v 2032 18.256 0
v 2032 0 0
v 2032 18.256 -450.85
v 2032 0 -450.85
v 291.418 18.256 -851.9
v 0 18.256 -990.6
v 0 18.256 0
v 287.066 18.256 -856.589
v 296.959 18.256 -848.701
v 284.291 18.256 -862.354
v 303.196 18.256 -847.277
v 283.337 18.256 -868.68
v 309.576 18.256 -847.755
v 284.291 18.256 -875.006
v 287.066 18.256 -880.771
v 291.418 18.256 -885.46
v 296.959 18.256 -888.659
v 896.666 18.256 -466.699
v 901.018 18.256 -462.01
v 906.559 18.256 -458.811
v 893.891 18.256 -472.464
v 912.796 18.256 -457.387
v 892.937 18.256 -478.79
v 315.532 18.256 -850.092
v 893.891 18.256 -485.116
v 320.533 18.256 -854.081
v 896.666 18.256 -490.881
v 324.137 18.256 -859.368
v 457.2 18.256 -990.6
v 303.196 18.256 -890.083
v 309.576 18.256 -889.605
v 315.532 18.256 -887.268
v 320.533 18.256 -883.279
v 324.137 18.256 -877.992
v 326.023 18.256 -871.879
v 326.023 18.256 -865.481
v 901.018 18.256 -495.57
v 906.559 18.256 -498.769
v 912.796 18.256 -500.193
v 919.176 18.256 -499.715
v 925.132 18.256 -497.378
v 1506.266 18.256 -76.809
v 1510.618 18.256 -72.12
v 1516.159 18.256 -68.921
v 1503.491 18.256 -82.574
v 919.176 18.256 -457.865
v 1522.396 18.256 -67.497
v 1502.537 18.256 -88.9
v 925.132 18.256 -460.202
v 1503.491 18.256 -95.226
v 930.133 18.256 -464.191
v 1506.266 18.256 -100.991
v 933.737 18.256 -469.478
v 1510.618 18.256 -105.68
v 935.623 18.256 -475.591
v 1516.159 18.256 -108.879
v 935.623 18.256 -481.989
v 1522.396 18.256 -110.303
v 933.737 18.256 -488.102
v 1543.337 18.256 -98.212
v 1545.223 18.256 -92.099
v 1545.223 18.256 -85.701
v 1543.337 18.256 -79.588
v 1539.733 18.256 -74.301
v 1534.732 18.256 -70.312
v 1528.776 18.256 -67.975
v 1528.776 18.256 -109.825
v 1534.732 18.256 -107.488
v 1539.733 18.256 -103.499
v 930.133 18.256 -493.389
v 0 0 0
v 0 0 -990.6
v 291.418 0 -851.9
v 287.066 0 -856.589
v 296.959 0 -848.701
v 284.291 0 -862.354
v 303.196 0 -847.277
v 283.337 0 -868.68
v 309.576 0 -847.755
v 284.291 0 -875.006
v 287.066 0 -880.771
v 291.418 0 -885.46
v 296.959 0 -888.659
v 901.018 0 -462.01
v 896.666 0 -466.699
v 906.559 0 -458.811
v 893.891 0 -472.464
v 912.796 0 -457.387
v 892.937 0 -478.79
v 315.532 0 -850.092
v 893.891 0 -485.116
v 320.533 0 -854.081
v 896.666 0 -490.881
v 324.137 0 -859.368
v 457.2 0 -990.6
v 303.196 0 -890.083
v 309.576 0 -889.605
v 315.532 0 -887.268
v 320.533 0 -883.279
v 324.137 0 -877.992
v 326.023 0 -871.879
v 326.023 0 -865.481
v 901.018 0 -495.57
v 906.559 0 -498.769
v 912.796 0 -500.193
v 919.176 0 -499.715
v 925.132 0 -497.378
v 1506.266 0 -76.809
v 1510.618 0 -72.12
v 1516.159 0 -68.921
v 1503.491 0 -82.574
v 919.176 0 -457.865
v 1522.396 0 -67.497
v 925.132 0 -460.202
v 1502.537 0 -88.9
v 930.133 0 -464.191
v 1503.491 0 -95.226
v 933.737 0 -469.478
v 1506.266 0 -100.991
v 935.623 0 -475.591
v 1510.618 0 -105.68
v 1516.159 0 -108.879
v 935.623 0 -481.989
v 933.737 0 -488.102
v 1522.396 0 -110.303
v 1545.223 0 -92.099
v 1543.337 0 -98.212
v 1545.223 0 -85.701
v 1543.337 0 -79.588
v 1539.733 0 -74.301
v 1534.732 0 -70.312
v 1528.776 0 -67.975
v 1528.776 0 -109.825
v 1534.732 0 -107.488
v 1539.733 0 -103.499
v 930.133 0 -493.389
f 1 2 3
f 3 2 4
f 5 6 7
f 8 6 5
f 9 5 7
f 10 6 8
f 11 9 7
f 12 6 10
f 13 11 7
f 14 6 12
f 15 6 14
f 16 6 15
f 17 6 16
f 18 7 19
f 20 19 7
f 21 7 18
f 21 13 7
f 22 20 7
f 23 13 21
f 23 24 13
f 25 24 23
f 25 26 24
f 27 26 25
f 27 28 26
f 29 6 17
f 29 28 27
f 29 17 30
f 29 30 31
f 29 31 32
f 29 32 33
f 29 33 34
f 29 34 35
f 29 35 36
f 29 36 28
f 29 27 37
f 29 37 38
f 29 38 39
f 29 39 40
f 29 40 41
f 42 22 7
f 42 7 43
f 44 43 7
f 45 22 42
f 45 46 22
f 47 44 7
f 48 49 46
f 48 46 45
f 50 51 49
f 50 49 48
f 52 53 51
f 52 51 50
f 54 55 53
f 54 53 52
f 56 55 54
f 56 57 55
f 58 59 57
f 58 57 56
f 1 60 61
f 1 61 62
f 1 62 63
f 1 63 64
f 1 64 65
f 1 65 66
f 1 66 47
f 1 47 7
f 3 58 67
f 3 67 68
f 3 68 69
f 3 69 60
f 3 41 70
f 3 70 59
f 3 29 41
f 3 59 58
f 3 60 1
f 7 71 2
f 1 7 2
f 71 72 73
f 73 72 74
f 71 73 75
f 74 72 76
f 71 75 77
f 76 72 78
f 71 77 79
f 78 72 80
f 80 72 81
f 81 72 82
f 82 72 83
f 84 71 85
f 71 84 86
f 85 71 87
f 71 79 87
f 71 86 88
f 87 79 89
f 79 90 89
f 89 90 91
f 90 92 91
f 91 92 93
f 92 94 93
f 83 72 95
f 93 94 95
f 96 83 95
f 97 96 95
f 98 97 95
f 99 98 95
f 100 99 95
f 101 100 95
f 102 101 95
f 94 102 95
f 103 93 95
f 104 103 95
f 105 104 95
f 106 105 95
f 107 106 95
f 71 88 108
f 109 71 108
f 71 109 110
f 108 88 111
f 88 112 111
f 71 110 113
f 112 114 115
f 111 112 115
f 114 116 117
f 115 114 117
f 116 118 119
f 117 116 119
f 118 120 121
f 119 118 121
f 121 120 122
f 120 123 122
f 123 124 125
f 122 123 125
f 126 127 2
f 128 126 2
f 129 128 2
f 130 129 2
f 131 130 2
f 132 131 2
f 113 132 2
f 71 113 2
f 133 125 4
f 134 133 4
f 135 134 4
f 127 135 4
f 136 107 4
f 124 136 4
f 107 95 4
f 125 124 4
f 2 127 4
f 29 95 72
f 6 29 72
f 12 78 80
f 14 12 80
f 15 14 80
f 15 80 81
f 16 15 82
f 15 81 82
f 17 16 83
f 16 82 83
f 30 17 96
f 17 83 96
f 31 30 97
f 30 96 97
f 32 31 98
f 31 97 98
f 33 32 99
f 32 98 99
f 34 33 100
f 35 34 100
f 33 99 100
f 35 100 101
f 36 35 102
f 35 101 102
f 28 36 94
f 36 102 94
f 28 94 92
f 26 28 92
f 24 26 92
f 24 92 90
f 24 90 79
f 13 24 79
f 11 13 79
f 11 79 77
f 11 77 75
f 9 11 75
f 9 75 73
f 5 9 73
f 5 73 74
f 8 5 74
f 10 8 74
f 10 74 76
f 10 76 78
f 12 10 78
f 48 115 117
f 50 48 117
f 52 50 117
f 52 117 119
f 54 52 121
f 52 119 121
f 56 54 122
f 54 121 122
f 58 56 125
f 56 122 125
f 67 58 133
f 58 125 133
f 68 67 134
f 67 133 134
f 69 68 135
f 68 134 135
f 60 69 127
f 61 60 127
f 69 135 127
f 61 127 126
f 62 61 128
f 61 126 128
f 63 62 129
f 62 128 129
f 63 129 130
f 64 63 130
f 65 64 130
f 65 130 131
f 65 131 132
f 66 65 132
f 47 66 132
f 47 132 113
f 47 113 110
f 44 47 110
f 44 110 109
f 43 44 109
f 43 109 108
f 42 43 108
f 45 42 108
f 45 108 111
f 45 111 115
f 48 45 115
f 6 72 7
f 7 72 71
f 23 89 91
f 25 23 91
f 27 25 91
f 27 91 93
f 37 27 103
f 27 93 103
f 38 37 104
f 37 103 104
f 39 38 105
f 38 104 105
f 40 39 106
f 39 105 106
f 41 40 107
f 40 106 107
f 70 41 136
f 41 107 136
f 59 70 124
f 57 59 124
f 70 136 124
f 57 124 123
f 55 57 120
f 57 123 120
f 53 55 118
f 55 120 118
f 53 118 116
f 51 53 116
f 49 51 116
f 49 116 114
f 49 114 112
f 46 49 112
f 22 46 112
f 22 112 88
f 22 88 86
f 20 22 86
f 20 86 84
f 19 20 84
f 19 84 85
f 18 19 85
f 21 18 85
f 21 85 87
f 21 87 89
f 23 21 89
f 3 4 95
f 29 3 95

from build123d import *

# Parameters (mm, degrees)
BOSS_EXTRUDE1_DEPTH       = 18.25625
F_1_1_69_DIAMETER_HOLE1_D = 42.926


with BuildPart() as part:
    # Sketch1 → Boss-Extrude1 (new body)
    with BuildSketch(Plane(origin=(0, 0, 0), x_dir=(1, 0, 0), z_dir=(0, 1, 0))):
        Polygon((2032, 450.85), (457.2, 990.6), (0, 990.6), (0, 0), (2032, 0), align=None)
    extrude(amount=BOSS_EXTRUDE1_DEPTH)

    # 1 (1.69) Diameter Hole1 (through all)
    with Locations(Plane(origin=(0, 18.25625, 0), x_dir=(1, 0, 0), z_dir=(0, 1, 0))):
        with Locations((1524, 88.9), (914.4, 478.79), (304.8, 868.68)):
            Hole(F_1_1_69_DIAMETER_HOLE1_D / 2)


solid = part.part
